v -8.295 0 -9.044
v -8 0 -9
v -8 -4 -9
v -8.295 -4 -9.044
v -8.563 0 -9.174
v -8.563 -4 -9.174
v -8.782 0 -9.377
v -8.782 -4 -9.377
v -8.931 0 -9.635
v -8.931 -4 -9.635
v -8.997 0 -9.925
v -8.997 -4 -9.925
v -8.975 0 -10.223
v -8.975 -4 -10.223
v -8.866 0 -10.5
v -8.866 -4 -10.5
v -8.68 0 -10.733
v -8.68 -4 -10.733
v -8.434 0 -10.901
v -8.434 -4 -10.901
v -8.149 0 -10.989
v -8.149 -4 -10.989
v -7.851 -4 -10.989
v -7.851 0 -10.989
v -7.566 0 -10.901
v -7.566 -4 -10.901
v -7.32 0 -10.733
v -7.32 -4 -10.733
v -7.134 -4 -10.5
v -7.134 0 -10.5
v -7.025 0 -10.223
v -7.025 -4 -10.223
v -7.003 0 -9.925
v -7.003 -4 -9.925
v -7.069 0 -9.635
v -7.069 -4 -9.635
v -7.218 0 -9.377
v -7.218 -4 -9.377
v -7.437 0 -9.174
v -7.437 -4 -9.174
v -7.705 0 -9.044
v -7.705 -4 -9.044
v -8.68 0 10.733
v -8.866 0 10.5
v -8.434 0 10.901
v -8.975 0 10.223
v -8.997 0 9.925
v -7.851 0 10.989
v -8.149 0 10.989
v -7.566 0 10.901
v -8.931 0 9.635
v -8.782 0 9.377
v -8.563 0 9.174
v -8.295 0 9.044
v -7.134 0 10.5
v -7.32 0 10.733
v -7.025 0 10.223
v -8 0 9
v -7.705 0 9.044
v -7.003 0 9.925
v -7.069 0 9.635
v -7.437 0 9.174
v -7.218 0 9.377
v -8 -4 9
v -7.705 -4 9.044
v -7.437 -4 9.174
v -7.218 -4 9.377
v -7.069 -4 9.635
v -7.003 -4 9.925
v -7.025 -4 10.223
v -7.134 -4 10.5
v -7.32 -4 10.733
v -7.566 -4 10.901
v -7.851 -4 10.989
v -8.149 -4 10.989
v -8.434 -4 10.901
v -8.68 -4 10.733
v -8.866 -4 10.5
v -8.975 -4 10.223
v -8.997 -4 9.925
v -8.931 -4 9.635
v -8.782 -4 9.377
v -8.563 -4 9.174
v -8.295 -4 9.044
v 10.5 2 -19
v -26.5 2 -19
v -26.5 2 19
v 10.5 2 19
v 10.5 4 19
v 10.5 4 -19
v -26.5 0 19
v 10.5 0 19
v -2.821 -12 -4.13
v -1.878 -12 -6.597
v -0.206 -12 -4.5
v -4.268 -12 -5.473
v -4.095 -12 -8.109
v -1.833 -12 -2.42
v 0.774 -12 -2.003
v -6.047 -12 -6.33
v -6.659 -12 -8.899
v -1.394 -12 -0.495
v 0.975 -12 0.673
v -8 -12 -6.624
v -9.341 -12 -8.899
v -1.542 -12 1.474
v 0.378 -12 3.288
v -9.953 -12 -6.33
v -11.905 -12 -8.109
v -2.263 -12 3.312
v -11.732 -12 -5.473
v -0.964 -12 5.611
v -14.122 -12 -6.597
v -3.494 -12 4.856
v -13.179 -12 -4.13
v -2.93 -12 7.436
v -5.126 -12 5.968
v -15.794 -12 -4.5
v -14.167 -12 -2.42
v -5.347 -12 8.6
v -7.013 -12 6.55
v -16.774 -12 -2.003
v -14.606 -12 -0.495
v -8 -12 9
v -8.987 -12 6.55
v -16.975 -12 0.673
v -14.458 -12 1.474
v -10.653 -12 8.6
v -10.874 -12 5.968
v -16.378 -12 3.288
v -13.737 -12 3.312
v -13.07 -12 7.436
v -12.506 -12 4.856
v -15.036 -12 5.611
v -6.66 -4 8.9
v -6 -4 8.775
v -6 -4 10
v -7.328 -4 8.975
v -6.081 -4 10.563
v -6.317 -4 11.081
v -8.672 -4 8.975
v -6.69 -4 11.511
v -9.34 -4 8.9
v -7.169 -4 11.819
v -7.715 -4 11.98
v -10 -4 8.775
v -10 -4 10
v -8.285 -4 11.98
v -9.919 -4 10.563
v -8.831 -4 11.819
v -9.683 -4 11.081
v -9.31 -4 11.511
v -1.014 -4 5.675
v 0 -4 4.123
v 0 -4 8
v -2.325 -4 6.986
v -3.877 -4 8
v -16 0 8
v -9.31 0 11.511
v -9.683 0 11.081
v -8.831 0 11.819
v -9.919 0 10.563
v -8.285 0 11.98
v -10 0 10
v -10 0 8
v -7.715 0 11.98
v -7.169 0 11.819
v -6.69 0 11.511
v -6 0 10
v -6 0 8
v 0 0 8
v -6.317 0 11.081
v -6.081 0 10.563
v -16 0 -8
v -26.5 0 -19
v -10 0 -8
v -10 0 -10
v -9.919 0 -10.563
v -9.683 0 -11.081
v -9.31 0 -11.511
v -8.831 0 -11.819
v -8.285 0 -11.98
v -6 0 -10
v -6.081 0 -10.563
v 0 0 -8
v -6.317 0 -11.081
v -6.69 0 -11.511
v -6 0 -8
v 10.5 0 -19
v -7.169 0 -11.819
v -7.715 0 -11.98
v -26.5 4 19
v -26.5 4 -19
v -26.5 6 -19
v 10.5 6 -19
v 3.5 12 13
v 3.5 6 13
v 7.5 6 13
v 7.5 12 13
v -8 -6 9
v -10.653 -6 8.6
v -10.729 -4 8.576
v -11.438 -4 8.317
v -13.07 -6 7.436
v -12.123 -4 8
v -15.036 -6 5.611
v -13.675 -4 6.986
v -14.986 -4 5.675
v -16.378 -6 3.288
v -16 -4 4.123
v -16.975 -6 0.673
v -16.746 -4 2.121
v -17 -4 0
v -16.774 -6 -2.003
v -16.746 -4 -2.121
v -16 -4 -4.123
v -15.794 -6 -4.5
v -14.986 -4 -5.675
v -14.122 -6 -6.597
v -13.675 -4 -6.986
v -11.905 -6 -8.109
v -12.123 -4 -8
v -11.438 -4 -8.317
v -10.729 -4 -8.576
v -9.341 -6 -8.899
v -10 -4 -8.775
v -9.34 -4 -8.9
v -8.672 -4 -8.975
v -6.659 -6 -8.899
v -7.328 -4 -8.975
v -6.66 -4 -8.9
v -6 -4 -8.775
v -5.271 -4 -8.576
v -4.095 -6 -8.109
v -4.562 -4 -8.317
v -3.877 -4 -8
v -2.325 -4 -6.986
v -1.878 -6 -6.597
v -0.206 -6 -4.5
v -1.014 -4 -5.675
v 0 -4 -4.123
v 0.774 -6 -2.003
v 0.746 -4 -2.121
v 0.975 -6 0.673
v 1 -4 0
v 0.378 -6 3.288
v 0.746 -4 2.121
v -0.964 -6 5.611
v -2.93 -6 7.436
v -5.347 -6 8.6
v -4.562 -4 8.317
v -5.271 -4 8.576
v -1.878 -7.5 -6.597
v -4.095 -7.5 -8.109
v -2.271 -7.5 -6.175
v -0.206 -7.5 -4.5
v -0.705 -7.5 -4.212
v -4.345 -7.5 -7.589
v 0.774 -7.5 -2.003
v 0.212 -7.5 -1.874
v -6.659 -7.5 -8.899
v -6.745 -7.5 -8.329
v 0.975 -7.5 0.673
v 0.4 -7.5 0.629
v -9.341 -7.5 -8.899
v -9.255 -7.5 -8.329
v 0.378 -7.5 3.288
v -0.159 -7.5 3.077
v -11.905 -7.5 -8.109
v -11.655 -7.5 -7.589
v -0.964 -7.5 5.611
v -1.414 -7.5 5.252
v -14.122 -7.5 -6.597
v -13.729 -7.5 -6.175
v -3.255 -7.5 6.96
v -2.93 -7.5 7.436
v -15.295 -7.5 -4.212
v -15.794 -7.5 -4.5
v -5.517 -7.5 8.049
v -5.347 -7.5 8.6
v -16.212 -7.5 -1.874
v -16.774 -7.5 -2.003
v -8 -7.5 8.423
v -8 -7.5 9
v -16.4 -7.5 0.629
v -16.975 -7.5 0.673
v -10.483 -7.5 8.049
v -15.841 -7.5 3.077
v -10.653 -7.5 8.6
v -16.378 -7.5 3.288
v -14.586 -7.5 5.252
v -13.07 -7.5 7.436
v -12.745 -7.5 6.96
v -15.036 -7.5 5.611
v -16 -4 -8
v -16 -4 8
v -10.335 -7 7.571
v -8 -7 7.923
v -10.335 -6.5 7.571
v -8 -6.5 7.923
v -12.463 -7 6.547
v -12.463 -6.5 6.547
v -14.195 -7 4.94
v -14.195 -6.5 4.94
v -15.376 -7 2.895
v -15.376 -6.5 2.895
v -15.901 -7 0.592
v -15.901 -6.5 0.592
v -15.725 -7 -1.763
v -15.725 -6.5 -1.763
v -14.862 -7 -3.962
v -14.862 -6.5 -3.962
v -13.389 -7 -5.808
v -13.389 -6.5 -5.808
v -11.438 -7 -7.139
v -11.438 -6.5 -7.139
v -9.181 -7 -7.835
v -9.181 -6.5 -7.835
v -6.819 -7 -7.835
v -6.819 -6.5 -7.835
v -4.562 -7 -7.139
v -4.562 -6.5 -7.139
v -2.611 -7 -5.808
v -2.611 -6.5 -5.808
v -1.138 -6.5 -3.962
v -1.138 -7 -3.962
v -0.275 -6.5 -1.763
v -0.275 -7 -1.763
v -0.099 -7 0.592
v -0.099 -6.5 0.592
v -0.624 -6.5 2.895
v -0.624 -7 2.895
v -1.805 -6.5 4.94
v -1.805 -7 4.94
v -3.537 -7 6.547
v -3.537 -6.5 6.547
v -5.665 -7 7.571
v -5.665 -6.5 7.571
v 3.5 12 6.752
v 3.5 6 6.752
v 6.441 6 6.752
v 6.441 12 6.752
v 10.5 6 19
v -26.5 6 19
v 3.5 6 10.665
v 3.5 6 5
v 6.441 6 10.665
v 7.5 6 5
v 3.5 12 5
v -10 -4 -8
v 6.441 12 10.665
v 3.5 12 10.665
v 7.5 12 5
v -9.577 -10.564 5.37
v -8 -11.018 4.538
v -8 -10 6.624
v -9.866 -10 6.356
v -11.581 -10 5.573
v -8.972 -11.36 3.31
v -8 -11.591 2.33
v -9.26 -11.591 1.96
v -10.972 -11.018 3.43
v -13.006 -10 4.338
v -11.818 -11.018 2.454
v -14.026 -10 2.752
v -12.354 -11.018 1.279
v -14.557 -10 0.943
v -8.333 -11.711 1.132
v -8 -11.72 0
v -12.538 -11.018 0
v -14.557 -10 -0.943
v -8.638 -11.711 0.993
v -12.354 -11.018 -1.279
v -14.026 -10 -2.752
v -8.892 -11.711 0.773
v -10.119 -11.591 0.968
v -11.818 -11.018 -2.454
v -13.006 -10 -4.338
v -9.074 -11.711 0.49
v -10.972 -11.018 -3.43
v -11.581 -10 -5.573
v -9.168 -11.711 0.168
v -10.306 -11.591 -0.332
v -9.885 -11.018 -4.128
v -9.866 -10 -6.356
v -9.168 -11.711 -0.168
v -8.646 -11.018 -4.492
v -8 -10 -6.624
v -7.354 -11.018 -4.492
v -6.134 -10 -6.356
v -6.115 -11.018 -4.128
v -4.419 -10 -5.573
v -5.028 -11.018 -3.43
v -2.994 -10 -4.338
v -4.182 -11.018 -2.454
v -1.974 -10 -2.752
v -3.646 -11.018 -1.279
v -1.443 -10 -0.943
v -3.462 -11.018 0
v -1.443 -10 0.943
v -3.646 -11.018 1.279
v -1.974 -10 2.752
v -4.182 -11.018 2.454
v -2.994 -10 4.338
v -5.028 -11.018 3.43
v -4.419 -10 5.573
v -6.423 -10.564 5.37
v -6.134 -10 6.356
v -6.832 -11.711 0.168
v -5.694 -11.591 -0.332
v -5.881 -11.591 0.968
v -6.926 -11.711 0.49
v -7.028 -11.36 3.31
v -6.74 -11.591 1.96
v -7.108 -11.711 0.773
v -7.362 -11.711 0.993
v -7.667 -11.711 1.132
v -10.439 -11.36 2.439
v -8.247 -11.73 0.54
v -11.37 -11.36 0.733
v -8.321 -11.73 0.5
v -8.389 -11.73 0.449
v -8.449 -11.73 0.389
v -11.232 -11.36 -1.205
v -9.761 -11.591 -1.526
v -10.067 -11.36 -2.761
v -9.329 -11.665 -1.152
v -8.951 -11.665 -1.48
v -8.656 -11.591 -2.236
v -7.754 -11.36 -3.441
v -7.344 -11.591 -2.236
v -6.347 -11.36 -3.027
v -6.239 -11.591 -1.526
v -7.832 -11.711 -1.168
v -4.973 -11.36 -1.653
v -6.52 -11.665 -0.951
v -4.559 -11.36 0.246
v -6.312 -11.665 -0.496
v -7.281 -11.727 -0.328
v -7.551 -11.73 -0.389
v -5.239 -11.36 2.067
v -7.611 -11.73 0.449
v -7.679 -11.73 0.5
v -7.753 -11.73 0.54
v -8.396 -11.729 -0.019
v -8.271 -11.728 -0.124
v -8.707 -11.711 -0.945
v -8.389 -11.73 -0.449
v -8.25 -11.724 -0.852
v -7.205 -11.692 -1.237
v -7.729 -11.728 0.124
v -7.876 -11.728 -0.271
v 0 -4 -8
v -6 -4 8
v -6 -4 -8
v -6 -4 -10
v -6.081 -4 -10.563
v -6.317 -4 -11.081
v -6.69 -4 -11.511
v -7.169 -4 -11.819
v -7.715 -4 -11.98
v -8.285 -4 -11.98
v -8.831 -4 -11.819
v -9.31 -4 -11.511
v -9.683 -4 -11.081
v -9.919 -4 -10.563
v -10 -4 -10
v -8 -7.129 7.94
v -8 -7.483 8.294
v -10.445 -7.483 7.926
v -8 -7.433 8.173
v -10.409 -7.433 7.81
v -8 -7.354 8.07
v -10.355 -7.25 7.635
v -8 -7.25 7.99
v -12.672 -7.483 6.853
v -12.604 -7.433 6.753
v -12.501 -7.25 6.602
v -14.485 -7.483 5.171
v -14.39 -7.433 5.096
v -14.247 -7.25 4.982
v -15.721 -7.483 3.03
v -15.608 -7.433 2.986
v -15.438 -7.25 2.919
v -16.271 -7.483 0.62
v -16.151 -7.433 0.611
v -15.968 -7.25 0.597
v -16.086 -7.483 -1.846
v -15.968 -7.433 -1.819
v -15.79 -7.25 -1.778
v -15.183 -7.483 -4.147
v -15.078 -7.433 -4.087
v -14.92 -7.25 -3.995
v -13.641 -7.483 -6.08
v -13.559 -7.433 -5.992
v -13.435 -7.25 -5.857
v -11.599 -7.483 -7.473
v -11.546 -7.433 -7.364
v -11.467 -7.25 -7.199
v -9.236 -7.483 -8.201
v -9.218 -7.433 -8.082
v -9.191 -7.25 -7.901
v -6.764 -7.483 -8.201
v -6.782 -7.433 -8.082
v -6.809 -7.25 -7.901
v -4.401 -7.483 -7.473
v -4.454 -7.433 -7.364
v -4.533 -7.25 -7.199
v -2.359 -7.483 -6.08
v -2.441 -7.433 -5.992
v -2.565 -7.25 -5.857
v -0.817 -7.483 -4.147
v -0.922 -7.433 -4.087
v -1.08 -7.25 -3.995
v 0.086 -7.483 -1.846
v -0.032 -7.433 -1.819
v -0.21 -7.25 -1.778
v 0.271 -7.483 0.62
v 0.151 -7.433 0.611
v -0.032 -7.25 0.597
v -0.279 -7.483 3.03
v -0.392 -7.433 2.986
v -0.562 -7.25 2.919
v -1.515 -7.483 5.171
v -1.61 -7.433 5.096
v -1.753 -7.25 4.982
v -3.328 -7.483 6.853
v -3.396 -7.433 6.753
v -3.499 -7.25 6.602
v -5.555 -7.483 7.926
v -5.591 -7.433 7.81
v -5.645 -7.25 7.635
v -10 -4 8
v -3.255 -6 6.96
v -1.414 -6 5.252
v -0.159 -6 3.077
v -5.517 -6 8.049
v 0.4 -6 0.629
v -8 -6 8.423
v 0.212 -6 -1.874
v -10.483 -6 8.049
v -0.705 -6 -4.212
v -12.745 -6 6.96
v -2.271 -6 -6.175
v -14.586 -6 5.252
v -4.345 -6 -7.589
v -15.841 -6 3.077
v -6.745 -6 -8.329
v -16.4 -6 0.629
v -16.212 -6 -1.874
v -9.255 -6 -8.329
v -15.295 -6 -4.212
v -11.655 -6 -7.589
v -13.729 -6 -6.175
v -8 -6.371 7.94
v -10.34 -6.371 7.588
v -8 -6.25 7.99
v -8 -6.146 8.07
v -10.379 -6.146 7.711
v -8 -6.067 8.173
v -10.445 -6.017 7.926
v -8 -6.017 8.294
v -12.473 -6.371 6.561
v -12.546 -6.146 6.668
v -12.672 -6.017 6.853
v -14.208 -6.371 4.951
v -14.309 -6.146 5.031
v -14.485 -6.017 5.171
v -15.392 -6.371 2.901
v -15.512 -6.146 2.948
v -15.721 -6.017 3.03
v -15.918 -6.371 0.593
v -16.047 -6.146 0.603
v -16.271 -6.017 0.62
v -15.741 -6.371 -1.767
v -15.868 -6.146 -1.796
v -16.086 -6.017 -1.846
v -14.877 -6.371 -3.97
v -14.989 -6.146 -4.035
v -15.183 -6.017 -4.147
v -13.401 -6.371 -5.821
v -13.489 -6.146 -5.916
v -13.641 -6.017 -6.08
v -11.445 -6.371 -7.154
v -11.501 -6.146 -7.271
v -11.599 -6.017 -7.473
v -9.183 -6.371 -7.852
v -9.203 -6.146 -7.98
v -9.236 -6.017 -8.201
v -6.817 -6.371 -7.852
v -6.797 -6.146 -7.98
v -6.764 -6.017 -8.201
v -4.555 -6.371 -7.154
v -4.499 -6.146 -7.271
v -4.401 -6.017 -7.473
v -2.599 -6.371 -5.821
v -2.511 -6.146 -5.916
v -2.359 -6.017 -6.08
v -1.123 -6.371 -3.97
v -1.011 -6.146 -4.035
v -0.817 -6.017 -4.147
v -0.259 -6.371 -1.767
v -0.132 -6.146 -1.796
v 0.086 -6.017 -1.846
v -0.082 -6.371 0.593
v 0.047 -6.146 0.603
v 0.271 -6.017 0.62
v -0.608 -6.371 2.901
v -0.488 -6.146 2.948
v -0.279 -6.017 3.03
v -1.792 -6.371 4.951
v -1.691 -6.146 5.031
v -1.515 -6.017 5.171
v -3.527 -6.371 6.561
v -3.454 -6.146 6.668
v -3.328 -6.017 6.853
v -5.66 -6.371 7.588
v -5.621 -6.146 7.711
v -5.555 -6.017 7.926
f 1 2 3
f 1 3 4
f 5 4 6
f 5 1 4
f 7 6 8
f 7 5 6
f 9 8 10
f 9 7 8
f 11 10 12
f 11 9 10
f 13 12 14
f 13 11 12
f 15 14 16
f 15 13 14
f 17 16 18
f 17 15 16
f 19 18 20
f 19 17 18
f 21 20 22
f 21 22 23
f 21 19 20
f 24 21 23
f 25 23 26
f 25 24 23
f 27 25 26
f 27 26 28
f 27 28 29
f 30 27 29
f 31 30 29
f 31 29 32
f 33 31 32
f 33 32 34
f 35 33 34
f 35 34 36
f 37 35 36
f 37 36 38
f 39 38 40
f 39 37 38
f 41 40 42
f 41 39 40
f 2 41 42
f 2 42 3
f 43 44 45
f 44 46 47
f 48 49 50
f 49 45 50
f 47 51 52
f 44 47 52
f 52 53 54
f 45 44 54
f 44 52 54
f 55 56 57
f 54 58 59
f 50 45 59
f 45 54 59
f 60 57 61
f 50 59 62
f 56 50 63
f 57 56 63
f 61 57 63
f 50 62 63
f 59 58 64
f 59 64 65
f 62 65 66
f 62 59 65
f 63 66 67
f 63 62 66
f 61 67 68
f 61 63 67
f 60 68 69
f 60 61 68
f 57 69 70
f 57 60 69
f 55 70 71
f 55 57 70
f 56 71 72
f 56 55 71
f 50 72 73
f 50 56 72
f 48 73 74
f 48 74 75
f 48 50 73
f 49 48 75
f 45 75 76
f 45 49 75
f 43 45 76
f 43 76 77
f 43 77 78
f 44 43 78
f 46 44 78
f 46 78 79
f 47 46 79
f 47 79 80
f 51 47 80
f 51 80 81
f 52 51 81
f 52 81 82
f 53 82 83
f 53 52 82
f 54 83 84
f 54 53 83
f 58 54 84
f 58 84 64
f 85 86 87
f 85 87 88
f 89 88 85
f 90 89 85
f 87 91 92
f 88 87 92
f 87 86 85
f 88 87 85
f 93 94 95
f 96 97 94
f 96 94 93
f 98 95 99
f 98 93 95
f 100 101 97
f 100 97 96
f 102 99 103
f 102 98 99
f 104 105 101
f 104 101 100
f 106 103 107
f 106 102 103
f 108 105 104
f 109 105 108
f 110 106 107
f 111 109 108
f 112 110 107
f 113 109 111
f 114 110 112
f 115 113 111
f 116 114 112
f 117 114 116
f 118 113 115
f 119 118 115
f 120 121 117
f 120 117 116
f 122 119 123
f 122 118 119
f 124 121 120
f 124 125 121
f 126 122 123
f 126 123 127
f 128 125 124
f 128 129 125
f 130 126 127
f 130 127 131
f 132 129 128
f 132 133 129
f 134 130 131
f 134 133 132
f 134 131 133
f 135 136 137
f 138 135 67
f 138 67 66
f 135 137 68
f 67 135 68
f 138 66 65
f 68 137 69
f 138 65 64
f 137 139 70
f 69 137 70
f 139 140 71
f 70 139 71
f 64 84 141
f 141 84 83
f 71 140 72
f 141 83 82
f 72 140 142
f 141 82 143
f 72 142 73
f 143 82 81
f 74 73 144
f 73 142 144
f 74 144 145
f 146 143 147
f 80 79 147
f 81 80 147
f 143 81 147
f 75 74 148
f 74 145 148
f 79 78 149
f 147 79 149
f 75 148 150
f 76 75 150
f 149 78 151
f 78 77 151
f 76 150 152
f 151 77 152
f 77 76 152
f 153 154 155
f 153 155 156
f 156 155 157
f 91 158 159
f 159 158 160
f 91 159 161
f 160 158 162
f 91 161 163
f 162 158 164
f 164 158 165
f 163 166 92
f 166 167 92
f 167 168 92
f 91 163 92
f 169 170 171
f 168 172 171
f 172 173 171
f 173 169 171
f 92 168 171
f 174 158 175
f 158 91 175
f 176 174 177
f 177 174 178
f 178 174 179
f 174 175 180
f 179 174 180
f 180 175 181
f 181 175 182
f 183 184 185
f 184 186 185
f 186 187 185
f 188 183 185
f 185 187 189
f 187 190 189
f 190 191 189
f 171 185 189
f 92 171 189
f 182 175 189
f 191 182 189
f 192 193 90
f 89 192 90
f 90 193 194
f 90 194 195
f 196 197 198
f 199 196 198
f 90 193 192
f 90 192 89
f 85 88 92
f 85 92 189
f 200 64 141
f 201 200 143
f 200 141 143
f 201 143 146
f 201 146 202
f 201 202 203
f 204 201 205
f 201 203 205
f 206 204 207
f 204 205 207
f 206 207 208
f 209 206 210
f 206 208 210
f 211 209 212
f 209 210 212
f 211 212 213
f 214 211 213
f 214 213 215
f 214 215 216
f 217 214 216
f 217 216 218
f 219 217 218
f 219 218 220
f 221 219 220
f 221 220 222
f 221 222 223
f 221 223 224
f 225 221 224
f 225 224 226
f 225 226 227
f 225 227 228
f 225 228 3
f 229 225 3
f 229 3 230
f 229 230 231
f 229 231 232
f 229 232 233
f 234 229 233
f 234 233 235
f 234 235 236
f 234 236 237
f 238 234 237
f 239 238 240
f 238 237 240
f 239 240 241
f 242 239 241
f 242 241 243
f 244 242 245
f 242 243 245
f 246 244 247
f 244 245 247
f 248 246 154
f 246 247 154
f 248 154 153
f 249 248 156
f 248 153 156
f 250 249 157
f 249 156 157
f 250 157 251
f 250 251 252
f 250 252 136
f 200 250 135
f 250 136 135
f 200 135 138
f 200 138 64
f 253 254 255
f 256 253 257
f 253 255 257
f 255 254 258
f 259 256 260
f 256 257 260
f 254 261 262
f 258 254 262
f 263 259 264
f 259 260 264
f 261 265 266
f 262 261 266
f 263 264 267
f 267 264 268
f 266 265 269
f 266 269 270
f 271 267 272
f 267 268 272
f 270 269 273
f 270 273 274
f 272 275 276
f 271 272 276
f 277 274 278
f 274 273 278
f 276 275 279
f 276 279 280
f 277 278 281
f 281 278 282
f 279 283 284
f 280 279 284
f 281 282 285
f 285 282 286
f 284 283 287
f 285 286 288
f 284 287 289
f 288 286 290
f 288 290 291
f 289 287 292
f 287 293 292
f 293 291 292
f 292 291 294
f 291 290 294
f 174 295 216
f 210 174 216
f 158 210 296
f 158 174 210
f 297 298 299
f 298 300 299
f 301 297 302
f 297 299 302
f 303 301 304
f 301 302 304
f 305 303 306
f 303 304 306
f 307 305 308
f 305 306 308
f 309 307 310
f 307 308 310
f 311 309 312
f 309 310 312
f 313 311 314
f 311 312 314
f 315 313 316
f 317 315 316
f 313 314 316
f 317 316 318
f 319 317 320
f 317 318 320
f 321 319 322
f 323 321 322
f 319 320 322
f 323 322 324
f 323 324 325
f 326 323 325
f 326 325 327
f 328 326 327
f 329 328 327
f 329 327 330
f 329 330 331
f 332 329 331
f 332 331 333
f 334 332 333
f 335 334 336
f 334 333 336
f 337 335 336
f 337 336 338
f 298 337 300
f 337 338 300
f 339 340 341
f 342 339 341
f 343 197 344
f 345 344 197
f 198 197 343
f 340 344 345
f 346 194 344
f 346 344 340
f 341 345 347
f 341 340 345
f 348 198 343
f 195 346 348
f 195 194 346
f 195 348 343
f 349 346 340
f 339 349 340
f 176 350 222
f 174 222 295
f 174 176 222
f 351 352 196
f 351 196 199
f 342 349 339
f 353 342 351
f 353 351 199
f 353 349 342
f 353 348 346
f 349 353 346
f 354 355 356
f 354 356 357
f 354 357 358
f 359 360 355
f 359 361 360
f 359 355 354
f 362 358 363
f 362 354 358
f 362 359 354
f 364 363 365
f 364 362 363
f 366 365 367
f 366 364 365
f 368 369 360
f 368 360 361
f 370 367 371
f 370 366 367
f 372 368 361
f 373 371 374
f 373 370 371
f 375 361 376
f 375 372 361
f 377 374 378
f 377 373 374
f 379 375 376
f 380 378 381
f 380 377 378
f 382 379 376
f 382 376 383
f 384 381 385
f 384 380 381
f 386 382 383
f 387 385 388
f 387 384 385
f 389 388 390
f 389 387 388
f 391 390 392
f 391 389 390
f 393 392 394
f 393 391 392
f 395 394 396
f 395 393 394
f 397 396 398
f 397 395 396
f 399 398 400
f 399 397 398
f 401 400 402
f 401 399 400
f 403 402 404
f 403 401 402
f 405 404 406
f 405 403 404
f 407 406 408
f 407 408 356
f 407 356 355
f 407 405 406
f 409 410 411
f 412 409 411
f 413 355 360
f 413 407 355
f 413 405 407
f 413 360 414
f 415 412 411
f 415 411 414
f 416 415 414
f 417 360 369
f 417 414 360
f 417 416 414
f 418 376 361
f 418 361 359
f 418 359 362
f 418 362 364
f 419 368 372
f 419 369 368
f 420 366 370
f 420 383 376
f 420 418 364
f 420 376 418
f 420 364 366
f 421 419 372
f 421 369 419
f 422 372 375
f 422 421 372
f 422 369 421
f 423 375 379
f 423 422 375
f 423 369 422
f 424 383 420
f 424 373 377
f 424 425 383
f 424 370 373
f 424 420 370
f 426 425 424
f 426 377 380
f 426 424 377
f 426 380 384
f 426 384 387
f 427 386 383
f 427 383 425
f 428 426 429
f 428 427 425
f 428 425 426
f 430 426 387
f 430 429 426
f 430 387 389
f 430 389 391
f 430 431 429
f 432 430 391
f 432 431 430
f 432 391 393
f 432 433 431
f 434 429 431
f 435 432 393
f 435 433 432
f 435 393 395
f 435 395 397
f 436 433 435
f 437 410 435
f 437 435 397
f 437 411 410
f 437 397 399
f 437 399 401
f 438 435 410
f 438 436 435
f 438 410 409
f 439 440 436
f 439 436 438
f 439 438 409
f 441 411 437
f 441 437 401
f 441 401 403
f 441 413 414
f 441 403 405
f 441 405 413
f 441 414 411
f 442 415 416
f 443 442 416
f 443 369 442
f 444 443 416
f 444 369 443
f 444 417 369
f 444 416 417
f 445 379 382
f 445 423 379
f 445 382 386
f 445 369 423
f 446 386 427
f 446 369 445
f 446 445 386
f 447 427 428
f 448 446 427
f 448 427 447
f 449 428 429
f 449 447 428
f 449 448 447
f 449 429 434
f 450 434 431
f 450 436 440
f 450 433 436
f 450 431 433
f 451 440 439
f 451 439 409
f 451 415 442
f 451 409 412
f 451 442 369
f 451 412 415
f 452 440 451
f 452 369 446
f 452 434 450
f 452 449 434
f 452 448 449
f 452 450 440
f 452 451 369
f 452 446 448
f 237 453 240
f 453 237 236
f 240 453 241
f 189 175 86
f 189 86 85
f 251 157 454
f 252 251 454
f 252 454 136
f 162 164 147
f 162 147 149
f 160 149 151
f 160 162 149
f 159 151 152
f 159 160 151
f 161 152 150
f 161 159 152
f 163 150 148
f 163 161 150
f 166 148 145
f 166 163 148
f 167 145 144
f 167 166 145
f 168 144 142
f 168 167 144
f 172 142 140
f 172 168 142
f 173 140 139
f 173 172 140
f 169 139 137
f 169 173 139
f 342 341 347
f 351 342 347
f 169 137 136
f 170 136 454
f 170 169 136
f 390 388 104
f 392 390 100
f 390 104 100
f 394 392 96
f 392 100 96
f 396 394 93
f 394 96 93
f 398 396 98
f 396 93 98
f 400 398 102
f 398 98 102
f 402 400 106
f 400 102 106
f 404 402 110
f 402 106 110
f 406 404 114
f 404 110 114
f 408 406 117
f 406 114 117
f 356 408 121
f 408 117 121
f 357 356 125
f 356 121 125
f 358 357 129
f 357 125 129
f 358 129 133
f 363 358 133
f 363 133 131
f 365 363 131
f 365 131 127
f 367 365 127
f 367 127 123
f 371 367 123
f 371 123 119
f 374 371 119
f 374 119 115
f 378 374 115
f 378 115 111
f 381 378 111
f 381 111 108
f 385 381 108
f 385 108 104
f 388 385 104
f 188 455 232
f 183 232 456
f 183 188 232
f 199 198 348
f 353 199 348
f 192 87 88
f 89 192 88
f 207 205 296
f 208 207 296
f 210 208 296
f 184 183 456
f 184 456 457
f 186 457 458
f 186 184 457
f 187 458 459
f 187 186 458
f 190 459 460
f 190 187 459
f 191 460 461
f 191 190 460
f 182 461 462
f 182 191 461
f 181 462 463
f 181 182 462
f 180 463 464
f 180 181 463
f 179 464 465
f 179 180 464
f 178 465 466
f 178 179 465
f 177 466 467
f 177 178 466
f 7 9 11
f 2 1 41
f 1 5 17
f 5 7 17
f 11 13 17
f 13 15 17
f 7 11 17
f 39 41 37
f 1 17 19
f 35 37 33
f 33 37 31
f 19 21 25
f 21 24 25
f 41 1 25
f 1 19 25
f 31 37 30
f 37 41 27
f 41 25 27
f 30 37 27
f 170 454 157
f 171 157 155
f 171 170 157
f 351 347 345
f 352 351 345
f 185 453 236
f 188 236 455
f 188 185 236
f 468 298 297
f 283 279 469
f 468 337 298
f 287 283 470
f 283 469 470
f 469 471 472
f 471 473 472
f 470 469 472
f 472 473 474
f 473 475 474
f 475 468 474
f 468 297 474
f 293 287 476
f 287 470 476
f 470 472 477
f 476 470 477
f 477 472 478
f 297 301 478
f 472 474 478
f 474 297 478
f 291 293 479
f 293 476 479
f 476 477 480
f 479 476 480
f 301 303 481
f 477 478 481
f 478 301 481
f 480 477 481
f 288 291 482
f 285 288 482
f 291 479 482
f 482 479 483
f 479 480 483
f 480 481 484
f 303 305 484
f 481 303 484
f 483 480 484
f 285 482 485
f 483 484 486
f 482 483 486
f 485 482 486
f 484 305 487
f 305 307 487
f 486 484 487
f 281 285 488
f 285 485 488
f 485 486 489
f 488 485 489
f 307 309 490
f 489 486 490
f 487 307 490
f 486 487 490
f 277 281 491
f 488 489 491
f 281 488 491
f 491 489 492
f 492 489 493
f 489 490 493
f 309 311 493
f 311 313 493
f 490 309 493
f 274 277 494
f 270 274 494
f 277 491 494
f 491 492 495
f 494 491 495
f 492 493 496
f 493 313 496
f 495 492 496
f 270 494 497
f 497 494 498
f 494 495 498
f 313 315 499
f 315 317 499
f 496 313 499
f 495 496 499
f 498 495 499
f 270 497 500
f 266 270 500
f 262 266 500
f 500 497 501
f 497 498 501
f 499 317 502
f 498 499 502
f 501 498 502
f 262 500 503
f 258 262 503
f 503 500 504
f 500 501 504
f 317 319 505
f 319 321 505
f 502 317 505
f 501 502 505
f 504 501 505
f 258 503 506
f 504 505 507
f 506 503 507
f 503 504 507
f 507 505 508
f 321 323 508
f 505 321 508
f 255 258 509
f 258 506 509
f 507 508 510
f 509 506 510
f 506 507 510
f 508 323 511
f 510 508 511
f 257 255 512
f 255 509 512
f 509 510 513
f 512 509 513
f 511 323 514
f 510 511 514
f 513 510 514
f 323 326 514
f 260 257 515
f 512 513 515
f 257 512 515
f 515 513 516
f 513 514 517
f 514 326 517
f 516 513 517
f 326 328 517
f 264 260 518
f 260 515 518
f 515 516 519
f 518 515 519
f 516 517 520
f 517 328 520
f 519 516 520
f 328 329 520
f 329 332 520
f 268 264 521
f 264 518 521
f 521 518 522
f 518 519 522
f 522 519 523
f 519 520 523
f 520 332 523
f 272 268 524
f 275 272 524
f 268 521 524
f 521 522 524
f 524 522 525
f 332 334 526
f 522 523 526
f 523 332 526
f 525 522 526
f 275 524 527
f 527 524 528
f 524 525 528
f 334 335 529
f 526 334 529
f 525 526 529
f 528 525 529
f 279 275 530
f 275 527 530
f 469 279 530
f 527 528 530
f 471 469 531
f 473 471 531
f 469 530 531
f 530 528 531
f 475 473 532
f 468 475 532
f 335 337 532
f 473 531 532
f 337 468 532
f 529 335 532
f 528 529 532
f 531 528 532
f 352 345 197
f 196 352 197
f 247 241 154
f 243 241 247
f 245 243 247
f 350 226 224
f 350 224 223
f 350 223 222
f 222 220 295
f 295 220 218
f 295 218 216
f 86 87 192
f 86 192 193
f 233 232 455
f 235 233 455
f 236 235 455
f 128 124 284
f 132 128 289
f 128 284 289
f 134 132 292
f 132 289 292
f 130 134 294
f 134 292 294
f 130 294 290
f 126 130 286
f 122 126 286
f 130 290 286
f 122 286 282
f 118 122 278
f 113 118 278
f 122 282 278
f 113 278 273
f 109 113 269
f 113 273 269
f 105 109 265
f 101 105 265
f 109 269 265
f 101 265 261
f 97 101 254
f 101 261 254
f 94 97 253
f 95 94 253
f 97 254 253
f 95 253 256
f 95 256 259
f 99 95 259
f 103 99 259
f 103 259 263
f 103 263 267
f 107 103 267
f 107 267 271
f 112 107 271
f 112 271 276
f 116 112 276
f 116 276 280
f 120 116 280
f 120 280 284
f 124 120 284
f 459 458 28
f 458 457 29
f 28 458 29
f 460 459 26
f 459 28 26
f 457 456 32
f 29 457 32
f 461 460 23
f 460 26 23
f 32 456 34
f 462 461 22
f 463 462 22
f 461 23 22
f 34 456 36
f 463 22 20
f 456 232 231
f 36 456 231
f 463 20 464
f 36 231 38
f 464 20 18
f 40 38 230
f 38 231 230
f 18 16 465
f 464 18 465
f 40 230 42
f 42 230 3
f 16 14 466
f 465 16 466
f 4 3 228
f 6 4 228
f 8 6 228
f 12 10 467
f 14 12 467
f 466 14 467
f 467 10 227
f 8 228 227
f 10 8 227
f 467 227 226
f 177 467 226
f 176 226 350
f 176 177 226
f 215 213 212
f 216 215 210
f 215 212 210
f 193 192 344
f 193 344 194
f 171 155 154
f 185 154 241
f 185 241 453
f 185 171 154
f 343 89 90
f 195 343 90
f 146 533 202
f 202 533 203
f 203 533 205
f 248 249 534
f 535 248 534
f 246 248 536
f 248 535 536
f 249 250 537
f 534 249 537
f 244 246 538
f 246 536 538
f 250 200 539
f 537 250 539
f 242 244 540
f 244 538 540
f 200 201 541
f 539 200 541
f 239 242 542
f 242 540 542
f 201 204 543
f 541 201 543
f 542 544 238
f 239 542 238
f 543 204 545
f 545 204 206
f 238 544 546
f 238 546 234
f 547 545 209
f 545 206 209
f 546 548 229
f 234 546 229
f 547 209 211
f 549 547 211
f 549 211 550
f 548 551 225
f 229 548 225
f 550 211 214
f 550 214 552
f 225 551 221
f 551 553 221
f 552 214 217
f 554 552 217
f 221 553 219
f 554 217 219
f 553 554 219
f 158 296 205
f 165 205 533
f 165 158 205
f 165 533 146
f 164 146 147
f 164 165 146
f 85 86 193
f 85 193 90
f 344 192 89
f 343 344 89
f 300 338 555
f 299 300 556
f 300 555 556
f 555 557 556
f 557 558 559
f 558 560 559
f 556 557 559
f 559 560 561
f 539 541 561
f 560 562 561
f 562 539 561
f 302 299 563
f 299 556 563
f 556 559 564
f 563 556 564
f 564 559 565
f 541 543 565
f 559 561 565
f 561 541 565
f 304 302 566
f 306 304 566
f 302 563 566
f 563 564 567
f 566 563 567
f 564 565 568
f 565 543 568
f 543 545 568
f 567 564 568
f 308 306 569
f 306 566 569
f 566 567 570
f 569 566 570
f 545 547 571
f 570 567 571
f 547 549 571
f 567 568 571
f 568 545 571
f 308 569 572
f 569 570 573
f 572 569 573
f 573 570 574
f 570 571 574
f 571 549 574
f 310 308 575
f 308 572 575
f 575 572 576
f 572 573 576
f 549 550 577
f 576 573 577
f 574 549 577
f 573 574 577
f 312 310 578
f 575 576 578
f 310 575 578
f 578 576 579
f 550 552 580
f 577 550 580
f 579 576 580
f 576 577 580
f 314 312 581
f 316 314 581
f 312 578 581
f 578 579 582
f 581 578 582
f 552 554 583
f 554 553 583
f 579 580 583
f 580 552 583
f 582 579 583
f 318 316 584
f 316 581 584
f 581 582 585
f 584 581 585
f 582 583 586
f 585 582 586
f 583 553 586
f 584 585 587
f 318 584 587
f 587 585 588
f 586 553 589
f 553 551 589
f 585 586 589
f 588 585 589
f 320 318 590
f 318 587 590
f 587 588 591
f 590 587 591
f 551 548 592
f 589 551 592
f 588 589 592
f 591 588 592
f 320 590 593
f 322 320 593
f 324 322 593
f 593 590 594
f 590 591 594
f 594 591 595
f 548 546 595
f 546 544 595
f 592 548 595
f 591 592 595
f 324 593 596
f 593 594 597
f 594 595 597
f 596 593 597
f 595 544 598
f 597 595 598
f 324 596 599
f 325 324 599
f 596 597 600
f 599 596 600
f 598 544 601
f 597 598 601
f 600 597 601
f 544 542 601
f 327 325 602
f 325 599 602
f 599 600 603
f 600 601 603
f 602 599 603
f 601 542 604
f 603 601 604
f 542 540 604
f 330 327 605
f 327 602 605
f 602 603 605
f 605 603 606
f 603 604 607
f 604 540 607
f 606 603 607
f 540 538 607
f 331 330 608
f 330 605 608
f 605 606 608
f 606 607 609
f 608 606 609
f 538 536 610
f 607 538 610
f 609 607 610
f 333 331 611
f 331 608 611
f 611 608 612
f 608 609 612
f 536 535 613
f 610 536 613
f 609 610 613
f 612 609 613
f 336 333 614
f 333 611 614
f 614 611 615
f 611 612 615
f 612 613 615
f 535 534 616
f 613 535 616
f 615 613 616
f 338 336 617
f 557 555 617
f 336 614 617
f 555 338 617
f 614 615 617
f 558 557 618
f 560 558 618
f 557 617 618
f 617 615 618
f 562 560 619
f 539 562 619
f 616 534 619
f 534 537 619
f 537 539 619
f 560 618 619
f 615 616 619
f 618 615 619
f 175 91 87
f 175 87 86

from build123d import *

# Parameters (mm, degrees)
SKETCH_1_W          = 53
SKETCH_1_H          = 38
SKETCH_1_R          = 1.5
EXTRUDE_1_DEPTH     = 2
SKETCH_2_W          = 37
SKETCH_2_H          = 38
EXTRUDE_2_DEPTH     = 2
SKETCH_3_W          = 37
SKETCH_3_H          = 38
EXTRUDE_3_DEPTH     = 2
EXTRUDE_4_DEPTH     = 6
SKETCH_5_R          = 1
EXTRUDE_5_DEPTH     = 4
SKETCH_6_R          = 9
EXTRUDE_6_DEPTH     = 8
SKETCH_7_R          = 6.62448747
CUT_EXTRUDE_1_DEPTH = 2
SKETCH1_W           = 16
SKETCH1_H           = 38
CUT_EXTRUDE1_DEPTH  = 10


with BuildPart() as part:
    # 草图1 → 凸台-拉伸1 (new body)
    with BuildSketch(Plane(origin=(0, 0, 0), x_dir=(1, 0, 0), z_dir=(0, 1, 0))):
        Rectangle(SKETCH_1_W, SKETCH_1_H)
        with Locations((21.5, 7.5)):
            Circle(SKETCH_1_R, mode=Mode.SUBTRACT)
        with Locations((21.5, -7.5)):
            Circle(SKETCH_1_R, mode=Mode.SUBTRACT)
    extrude(amount=EXTRUDE_1_DEPTH)

    # 草图5 → 凸台-拉伸5 (add)
    with BuildSketch(Plane.XZ):
        with BuildLine():
            Line((-6, 10), (-6, 8))
            Line((-6, 8), (0, 8))
            Line((0, 8), (0, -8))
            Line((0, -8), (-6, -8))
            Line((-6, -8), (-6, -10))
            ThreePointArc((-6, -10), (-8, -12), (-10, -10))
            Line((-10, -10), (-10, -8))
            Line((-10, -8), (-16, -8))
            Line((-16, -8), (-16, 8))
            Line((-16, 8), (-10, 8))
            Line((-10, 8), (-10, 10))
            ThreePointArc((-10, 10), (-8, 12), (-6, 10))
        make_face()
        with Locations((-8, 10)):
            Circle(SKETCH_5_R, mode=Mode.SUBTRACT)
        with Locations((-8, -10)):
            Circle(SKETCH_5_R, mode=Mode.SUBTRACT)
    extrude(amount=EXTRUDE_5_DEPTH)

    # 草图6 → 凸台-拉伸6 (add)
    with BuildSketch(Plane.XZ.offset(4)):
        with Locations((-8, 0)):
            Circle(SKETCH_6_R)
    extrude(amount=EXTRUDE_6_DEPTH)

    # 草图7 → 切除-拉伸1 (cut)
    with BuildSketch(Plane.XZ.offset(12)):
        with Locations((-8, 0)):
            Circle(SKETCH_7_R)
    extrude(amount=-CUT_EXTRUDE_1_DEPTH, mode=Mode.SUBTRACT)

    # 草图8 → 旋转1 (revolve)
    with BuildSketch(Plane(origin=(-8, 0, 0), x_dir=(0, -1, 0), z_dir=(1, 0, 0))):
        with BuildLine():
            Line((10, 0), (11.720143423, 0))
            add(Edge.make_bspline(
                [(10, -6.62448747), (11.859849746, -3.586362146), (11.720143423, 0)],
                knots=[0, 0, 0, 1, 1, 1], degree=2))
            Line((10, -6.62448747), (10, 0))
        make_face()
    revolve(axis=Axis((-8, -10, 0), (0, -1, 0)))

    # 草图9 → 切除-旋转1 (revolve, cut)
    with BuildSketch(Plane(origin=(-8, 0, 0), x_dir=(0, -1, 0), z_dir=(1, 0, 0))):
        with BuildLine():
            Line((6, -9), (7.5, -9))
            Line((7.5, -9), (7.5, -8.423402625))
            ThreePointArc((7.5, -8.423402625), (7.353553391, -8.069849234), (7, -7.923402625))
            Line((7, -7.923402625), (6.5, -7.923402625))
            ThreePointArc((6.5, -7.923402625), (6.146446609, -8.069849234), (6, -8.423402625))
            Line((6, -8.423402625), (6, -9))
        make_face()
    revolve(axis=Axis((-8, -6.28732061, 0), (0, -1, 0)), mode=Mode.SUBTRACT)

    # Sketch1 → Cut-Extrude1 (cut)
    with BuildSketch(Plane(origin=(0, 2, 0), x_dir=(1, 0, 0), z_dir=(0, 1, 0))):
        with Locations((18.5, 0)):
            Rectangle(SKETCH1_W, SKETCH1_H)
    extrude(amount=-CUT_EXTRUDE1_DEPTH, mode=Mode.SUBTRACT)


with BuildPart() as body_2:
    # 草图2 → 凸台-拉伸2 (new body)
    with BuildSketch(Plane(origin=(0, 2, 0), x_dir=(1, 0, 0), z_dir=(0, 1, 0))):
        with Locations((-8, 0)):
            Rectangle(SKETCH_2_W, SKETCH_2_H)
    extrude(amount=EXTRUDE_2_DEPTH)


with BuildPart() as body_3:
    # 草图3 → 凸台-拉伸3 (new body)
    with BuildSketch(Plane(origin=(0, 4, 0), x_dir=(1, 0, 0), z_dir=(0, 1, 0))):
        with Locations((-8, 0)):
            Rectangle(SKETCH_3_W, SKETCH_3_H)
    extrude(amount=EXTRUDE_3_DEPTH)

    # 草图4 → 凸台-拉伸4 (add)
    with BuildSketch(Plane(origin=(0, 6, 0), x_dir=(1, 0, 0), z_dir=(0, 1, 0))):
        Polygon((3.5, -10.664911908), (3.5, -13), (7.5, -13), (7.5, -5), (3.5, -5), (3.5, -6.751845124), (6.441233058, -6.751845124), (6.441233058, -10.664911908), align=None)
    extrude(amount=EXTRUDE_4_DEPTH)


solid = Compound([part.part, body_2.part, body_3.part])
